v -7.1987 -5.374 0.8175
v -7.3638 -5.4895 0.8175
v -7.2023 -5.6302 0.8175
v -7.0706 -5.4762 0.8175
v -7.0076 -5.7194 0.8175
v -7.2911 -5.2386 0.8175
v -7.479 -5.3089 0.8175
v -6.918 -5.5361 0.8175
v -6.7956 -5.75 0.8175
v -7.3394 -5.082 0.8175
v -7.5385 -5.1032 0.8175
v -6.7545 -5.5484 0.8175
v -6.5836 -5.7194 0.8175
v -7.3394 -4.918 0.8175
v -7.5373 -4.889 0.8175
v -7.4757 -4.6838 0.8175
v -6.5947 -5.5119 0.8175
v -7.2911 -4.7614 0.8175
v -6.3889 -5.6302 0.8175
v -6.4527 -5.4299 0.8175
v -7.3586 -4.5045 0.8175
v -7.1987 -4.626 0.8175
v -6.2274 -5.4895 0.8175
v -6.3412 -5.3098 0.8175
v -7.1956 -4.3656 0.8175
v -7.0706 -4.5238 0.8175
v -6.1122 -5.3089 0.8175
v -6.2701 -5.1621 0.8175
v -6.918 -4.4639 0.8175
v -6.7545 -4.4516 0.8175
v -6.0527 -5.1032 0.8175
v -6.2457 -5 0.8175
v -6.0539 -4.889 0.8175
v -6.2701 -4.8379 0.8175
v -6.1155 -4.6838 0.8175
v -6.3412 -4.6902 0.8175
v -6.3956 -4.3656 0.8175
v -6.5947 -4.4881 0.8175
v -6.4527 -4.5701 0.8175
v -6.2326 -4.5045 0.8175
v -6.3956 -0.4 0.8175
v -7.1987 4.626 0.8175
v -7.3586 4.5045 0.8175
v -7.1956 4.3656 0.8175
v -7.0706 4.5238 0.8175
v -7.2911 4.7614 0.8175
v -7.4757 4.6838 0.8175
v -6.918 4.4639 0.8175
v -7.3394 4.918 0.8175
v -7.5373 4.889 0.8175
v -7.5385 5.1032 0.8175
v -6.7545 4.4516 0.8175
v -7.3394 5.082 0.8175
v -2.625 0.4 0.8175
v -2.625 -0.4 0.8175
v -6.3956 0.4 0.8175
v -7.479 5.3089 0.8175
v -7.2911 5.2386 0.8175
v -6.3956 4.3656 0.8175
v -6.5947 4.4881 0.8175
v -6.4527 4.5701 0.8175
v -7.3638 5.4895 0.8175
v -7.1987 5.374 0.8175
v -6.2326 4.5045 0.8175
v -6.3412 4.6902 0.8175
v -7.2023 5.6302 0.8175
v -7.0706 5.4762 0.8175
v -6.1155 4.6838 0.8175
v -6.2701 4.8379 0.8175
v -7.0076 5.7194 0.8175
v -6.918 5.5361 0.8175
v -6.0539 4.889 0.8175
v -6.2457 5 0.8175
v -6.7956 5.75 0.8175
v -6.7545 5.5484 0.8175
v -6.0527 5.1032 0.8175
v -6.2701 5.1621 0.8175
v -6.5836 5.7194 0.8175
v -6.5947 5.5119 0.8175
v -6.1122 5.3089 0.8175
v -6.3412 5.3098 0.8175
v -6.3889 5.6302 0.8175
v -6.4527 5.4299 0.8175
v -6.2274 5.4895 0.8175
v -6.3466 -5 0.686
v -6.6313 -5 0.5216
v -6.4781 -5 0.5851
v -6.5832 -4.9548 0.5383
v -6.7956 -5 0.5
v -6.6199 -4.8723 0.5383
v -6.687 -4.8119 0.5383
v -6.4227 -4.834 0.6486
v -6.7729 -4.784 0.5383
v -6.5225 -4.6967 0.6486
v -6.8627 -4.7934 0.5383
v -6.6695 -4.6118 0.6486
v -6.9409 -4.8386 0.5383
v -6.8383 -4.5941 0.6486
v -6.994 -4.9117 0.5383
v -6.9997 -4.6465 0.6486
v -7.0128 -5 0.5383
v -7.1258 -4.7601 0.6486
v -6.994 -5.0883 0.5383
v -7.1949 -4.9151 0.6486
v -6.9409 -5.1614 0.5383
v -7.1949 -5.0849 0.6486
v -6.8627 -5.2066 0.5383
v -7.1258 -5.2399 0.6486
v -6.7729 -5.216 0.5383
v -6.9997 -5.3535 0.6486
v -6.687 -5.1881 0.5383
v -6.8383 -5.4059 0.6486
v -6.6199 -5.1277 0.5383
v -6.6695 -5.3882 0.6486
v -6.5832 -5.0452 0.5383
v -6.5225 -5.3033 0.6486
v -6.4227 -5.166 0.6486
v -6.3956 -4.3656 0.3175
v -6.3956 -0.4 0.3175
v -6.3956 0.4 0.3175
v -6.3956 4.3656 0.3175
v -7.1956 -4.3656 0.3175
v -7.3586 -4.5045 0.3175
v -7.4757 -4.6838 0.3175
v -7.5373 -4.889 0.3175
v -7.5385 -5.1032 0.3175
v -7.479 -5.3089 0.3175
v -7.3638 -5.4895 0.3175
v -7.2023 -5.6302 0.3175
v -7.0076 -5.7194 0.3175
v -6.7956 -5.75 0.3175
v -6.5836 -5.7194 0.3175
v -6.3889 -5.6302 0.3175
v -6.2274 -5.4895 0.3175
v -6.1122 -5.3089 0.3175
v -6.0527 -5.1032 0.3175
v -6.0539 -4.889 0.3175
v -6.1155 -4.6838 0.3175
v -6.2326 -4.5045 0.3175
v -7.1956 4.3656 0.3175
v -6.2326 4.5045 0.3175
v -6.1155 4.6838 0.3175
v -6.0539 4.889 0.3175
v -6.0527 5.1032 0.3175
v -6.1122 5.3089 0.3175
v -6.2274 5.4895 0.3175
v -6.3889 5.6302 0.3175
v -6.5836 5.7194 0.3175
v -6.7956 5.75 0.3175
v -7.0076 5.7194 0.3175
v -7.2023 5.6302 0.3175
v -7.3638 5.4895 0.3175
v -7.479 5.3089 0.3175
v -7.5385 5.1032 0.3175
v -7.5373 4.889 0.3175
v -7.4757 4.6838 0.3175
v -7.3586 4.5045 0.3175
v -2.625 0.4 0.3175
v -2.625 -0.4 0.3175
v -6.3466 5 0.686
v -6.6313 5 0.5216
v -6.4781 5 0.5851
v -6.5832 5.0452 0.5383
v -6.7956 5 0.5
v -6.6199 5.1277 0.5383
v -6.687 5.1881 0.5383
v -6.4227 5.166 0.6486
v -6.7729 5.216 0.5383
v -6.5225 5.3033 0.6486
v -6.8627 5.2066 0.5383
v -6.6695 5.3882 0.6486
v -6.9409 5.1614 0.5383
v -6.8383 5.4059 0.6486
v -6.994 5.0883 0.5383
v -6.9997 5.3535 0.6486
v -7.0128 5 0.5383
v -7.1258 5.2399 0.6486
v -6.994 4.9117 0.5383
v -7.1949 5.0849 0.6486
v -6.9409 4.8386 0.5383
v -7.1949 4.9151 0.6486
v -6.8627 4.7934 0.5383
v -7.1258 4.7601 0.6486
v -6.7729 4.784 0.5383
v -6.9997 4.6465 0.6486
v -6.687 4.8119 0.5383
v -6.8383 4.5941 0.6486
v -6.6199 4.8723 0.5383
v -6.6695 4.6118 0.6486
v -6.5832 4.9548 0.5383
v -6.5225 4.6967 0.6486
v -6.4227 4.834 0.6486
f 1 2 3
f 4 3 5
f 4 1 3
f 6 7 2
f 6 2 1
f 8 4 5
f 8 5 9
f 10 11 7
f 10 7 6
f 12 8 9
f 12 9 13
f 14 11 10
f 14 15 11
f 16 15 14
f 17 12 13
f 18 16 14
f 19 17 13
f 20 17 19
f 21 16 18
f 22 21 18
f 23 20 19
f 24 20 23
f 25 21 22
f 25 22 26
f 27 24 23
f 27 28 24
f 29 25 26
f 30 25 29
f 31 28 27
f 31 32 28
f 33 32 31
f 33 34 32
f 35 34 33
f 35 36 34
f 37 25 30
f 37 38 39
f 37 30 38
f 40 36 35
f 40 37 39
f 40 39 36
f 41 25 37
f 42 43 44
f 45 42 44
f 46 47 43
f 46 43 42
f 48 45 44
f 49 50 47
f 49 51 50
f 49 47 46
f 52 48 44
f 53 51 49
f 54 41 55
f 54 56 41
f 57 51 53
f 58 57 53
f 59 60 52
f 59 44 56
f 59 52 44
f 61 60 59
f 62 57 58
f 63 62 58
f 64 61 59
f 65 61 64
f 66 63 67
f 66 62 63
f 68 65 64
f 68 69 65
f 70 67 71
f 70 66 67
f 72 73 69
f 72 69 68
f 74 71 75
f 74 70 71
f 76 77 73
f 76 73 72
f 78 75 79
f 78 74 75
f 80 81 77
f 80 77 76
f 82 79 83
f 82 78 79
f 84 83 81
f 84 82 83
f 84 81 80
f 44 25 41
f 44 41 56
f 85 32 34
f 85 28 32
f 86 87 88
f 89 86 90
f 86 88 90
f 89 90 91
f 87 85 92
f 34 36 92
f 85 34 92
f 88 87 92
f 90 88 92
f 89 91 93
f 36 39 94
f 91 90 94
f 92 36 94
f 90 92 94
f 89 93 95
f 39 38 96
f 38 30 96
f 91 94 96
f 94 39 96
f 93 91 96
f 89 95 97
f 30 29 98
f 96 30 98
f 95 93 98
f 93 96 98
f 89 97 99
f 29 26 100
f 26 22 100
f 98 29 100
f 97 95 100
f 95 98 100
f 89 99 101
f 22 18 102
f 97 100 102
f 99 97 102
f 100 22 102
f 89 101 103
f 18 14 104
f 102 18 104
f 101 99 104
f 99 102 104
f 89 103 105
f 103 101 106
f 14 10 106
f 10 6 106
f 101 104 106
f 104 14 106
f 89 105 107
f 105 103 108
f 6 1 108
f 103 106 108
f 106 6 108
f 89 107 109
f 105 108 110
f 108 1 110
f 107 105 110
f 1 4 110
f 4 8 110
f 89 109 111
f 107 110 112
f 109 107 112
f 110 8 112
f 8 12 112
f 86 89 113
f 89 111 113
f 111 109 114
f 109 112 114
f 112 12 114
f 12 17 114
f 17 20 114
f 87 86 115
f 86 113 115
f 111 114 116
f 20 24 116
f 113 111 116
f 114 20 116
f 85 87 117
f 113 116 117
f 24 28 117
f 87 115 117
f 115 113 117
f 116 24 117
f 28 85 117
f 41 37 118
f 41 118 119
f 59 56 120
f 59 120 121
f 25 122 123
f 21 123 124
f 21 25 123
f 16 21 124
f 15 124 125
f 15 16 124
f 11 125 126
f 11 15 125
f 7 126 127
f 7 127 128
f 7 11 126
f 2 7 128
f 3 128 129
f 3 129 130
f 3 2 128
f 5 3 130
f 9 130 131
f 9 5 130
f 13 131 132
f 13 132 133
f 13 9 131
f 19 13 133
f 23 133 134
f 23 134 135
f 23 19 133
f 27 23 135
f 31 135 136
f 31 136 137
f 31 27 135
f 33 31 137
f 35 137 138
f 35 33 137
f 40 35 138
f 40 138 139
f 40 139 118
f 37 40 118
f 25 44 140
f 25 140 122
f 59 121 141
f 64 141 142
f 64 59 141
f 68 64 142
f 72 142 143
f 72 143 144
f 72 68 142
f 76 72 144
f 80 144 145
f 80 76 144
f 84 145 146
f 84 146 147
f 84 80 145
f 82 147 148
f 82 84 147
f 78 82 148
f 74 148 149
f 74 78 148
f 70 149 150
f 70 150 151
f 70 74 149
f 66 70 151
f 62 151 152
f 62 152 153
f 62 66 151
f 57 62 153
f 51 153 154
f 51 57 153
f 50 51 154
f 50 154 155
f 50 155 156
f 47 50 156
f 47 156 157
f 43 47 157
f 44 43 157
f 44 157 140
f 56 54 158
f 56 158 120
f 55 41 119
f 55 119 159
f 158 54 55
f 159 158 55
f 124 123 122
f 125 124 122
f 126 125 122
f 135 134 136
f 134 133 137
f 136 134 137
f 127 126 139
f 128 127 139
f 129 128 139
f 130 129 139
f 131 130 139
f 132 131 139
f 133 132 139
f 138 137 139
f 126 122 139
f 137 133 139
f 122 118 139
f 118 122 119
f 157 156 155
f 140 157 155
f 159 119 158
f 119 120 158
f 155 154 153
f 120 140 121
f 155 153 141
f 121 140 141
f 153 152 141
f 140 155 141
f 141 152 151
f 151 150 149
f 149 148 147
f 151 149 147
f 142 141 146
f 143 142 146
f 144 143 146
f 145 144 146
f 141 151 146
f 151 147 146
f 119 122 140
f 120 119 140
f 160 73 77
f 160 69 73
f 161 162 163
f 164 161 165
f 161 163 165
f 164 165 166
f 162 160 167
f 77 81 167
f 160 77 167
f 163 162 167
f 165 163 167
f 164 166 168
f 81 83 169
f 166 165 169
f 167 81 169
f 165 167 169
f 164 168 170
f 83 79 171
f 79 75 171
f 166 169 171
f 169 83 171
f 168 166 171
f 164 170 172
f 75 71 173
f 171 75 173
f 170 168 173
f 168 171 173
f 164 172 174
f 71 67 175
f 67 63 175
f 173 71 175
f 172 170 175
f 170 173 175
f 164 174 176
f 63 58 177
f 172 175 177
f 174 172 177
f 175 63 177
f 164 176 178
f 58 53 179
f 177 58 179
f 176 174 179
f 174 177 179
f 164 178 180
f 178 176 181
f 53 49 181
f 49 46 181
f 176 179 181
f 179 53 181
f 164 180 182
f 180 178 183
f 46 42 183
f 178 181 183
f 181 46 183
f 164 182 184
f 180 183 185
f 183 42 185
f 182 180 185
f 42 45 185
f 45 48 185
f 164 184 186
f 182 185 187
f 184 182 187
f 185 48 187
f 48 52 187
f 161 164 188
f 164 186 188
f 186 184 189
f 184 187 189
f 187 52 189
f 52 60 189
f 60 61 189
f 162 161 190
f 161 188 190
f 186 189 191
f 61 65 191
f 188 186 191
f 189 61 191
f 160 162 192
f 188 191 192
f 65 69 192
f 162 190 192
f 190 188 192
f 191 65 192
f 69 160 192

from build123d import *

# Parameters (mm, degrees)
PAD_DEPTH    = 0.25
SKETCH001_R  = 0.75
PAD001_DEPTH = 0.25
SKETCH002_R  = 0.75
PAD002_DEPTH = 0.25
SKETCH003_R  = 0.75
PAD003_DEPTH = 0.25
SKETCH004_R  = 0.75
PAD004_DEPTH = 0.4
SKETCH005_W  = 10
SKETCH005_H  = 10
POCKET_DEPTH = 12.626


with BuildPart() as part:
    # Sketch (on DatumPlane) → Pad (new body, symmetric)
    with BuildSketch(Plane.XY.offset(0.5675)):
        Polygon((-7.195606, 5), (-7.195606, 0), (-7.195606, -5), (-6.795606, -5), (-6.395606, -5), (-6.395606, -0.4), (10, -0.4), (10, 0.4), (-6.395606, 0.4), (-6.395606, 5), (-6.795606, 5), align=None)
    extrude(amount=PAD_DEPTH, both=True)

    # Sketch001 (on DatumPlane) → Pad001 (join, symmetric)
    with BuildSketch(Plane.XY.offset(0.5675)):
        Circle(SKETCH001_R)
    extrude(amount=PAD001_DEPTH, both=True)

    # Sketch002 (on DatumPlane) → Pad002 (join, symmetric)
    with BuildSketch(Plane.XY.offset(0.5675)):
        with Locations((-6.795606, 5)):
            Circle(SKETCH002_R)
    extrude(amount=PAD002_DEPTH, both=True)

    # Sketch003 (on DatumPlane) → Pad003 (join, symmetric)
    with BuildSketch(Plane.XY.offset(0.5675)):
        with Locations((-6.795606, -5)):
            Circle(SKETCH003_R)
    extrude(amount=PAD003_DEPTH, both=True)

    # Sphere → Sphere (revolve, cut)
    with BuildSketch(Plane.XZ):
        with BuildLine():
            ThreePointArc((0, -0.635), (0.635, 0), (0, 0.635))
            Line((0, 0.635), (0, -0.635))
        make_face()
    revolve(axis=Axis((0, 0, 0), (0, 0, 1)), mode=Mode.SUBTRACT)

    # Sphere001 → Sphere001 (revolve, cut)
    with BuildSketch(Plane(origin=(-6.795606, 5, 1.135), x_dir=(1, 0, 0), z_dir=(0, -1, 0))):
        with BuildLine():
            ThreePointArc((0, -0.635), (0.635, 0), (0, 0.635))
            Line((0, 0.635), (0, -0.635))
        make_face()
    revolve(axis=Axis((-6.795606, 5, 1.135), (0, 0, 1)), mode=Mode.SUBTRACT)

    # Sphere002 → Sphere002 (revolve, cut)
    with BuildSketch(Plane(origin=(-6.795606, -5, 1.135), x_dir=(1, 0, 0), z_dir=(0, -1, 0))):
        with BuildLine():
            ThreePointArc((0, -0.635), (0.635, 0), (0, 0.635))
            Line((0, 0.635), (0, -0.635))
        make_face()
    revolve(axis=Axis((-6.795606, -5, 1.135), (0, 0, 1)), mode=Mode.SUBTRACT)

    # Sketch004 (on DatumPlane) → Pad004 (join, symmetric)
    with BuildSketch(Plane(origin=(0, 0, 0.5675), x_dir=(1, 0, 0), z_dir=(0, -1, 0))):
        with Locations((6.8, 0)):
            Circle(SKETCH004_R)
    extrude(amount=PAD004_DEPTH, both=True)

    # Sphere003 → Sphere003 (revolve, cut)
    with BuildSketch(Plane(origin=(6.8, 0.7175, 0.5675), x_dir=(1, 0, 0), z_dir=(0, -1, 0))):
        with BuildLine():
            ThreePointArc((0, -0.635), (0.635, 0), (0, 0.635))
            Line((0, 0.635), (0, -0.635))
        make_face()
    revolve(axis=Axis((6.8, 0.7175, 0.5675), (0, 0, 1)), mode=Mode.SUBTRACT)

    # Sketch005 (on DatumPlane) → Pocket (cut, through all)
    with BuildSketch(Plane(origin=(-2.625, 0, 0), x_dir=(0, -1, 0), z_dir=(-1, 0, 0))):
        Rectangle(SKETCH005_W, SKETCH005_H)
    extrude(amount=-POCKET_DEPTH, mode=Mode.SUBTRACT)


solid = part.part
